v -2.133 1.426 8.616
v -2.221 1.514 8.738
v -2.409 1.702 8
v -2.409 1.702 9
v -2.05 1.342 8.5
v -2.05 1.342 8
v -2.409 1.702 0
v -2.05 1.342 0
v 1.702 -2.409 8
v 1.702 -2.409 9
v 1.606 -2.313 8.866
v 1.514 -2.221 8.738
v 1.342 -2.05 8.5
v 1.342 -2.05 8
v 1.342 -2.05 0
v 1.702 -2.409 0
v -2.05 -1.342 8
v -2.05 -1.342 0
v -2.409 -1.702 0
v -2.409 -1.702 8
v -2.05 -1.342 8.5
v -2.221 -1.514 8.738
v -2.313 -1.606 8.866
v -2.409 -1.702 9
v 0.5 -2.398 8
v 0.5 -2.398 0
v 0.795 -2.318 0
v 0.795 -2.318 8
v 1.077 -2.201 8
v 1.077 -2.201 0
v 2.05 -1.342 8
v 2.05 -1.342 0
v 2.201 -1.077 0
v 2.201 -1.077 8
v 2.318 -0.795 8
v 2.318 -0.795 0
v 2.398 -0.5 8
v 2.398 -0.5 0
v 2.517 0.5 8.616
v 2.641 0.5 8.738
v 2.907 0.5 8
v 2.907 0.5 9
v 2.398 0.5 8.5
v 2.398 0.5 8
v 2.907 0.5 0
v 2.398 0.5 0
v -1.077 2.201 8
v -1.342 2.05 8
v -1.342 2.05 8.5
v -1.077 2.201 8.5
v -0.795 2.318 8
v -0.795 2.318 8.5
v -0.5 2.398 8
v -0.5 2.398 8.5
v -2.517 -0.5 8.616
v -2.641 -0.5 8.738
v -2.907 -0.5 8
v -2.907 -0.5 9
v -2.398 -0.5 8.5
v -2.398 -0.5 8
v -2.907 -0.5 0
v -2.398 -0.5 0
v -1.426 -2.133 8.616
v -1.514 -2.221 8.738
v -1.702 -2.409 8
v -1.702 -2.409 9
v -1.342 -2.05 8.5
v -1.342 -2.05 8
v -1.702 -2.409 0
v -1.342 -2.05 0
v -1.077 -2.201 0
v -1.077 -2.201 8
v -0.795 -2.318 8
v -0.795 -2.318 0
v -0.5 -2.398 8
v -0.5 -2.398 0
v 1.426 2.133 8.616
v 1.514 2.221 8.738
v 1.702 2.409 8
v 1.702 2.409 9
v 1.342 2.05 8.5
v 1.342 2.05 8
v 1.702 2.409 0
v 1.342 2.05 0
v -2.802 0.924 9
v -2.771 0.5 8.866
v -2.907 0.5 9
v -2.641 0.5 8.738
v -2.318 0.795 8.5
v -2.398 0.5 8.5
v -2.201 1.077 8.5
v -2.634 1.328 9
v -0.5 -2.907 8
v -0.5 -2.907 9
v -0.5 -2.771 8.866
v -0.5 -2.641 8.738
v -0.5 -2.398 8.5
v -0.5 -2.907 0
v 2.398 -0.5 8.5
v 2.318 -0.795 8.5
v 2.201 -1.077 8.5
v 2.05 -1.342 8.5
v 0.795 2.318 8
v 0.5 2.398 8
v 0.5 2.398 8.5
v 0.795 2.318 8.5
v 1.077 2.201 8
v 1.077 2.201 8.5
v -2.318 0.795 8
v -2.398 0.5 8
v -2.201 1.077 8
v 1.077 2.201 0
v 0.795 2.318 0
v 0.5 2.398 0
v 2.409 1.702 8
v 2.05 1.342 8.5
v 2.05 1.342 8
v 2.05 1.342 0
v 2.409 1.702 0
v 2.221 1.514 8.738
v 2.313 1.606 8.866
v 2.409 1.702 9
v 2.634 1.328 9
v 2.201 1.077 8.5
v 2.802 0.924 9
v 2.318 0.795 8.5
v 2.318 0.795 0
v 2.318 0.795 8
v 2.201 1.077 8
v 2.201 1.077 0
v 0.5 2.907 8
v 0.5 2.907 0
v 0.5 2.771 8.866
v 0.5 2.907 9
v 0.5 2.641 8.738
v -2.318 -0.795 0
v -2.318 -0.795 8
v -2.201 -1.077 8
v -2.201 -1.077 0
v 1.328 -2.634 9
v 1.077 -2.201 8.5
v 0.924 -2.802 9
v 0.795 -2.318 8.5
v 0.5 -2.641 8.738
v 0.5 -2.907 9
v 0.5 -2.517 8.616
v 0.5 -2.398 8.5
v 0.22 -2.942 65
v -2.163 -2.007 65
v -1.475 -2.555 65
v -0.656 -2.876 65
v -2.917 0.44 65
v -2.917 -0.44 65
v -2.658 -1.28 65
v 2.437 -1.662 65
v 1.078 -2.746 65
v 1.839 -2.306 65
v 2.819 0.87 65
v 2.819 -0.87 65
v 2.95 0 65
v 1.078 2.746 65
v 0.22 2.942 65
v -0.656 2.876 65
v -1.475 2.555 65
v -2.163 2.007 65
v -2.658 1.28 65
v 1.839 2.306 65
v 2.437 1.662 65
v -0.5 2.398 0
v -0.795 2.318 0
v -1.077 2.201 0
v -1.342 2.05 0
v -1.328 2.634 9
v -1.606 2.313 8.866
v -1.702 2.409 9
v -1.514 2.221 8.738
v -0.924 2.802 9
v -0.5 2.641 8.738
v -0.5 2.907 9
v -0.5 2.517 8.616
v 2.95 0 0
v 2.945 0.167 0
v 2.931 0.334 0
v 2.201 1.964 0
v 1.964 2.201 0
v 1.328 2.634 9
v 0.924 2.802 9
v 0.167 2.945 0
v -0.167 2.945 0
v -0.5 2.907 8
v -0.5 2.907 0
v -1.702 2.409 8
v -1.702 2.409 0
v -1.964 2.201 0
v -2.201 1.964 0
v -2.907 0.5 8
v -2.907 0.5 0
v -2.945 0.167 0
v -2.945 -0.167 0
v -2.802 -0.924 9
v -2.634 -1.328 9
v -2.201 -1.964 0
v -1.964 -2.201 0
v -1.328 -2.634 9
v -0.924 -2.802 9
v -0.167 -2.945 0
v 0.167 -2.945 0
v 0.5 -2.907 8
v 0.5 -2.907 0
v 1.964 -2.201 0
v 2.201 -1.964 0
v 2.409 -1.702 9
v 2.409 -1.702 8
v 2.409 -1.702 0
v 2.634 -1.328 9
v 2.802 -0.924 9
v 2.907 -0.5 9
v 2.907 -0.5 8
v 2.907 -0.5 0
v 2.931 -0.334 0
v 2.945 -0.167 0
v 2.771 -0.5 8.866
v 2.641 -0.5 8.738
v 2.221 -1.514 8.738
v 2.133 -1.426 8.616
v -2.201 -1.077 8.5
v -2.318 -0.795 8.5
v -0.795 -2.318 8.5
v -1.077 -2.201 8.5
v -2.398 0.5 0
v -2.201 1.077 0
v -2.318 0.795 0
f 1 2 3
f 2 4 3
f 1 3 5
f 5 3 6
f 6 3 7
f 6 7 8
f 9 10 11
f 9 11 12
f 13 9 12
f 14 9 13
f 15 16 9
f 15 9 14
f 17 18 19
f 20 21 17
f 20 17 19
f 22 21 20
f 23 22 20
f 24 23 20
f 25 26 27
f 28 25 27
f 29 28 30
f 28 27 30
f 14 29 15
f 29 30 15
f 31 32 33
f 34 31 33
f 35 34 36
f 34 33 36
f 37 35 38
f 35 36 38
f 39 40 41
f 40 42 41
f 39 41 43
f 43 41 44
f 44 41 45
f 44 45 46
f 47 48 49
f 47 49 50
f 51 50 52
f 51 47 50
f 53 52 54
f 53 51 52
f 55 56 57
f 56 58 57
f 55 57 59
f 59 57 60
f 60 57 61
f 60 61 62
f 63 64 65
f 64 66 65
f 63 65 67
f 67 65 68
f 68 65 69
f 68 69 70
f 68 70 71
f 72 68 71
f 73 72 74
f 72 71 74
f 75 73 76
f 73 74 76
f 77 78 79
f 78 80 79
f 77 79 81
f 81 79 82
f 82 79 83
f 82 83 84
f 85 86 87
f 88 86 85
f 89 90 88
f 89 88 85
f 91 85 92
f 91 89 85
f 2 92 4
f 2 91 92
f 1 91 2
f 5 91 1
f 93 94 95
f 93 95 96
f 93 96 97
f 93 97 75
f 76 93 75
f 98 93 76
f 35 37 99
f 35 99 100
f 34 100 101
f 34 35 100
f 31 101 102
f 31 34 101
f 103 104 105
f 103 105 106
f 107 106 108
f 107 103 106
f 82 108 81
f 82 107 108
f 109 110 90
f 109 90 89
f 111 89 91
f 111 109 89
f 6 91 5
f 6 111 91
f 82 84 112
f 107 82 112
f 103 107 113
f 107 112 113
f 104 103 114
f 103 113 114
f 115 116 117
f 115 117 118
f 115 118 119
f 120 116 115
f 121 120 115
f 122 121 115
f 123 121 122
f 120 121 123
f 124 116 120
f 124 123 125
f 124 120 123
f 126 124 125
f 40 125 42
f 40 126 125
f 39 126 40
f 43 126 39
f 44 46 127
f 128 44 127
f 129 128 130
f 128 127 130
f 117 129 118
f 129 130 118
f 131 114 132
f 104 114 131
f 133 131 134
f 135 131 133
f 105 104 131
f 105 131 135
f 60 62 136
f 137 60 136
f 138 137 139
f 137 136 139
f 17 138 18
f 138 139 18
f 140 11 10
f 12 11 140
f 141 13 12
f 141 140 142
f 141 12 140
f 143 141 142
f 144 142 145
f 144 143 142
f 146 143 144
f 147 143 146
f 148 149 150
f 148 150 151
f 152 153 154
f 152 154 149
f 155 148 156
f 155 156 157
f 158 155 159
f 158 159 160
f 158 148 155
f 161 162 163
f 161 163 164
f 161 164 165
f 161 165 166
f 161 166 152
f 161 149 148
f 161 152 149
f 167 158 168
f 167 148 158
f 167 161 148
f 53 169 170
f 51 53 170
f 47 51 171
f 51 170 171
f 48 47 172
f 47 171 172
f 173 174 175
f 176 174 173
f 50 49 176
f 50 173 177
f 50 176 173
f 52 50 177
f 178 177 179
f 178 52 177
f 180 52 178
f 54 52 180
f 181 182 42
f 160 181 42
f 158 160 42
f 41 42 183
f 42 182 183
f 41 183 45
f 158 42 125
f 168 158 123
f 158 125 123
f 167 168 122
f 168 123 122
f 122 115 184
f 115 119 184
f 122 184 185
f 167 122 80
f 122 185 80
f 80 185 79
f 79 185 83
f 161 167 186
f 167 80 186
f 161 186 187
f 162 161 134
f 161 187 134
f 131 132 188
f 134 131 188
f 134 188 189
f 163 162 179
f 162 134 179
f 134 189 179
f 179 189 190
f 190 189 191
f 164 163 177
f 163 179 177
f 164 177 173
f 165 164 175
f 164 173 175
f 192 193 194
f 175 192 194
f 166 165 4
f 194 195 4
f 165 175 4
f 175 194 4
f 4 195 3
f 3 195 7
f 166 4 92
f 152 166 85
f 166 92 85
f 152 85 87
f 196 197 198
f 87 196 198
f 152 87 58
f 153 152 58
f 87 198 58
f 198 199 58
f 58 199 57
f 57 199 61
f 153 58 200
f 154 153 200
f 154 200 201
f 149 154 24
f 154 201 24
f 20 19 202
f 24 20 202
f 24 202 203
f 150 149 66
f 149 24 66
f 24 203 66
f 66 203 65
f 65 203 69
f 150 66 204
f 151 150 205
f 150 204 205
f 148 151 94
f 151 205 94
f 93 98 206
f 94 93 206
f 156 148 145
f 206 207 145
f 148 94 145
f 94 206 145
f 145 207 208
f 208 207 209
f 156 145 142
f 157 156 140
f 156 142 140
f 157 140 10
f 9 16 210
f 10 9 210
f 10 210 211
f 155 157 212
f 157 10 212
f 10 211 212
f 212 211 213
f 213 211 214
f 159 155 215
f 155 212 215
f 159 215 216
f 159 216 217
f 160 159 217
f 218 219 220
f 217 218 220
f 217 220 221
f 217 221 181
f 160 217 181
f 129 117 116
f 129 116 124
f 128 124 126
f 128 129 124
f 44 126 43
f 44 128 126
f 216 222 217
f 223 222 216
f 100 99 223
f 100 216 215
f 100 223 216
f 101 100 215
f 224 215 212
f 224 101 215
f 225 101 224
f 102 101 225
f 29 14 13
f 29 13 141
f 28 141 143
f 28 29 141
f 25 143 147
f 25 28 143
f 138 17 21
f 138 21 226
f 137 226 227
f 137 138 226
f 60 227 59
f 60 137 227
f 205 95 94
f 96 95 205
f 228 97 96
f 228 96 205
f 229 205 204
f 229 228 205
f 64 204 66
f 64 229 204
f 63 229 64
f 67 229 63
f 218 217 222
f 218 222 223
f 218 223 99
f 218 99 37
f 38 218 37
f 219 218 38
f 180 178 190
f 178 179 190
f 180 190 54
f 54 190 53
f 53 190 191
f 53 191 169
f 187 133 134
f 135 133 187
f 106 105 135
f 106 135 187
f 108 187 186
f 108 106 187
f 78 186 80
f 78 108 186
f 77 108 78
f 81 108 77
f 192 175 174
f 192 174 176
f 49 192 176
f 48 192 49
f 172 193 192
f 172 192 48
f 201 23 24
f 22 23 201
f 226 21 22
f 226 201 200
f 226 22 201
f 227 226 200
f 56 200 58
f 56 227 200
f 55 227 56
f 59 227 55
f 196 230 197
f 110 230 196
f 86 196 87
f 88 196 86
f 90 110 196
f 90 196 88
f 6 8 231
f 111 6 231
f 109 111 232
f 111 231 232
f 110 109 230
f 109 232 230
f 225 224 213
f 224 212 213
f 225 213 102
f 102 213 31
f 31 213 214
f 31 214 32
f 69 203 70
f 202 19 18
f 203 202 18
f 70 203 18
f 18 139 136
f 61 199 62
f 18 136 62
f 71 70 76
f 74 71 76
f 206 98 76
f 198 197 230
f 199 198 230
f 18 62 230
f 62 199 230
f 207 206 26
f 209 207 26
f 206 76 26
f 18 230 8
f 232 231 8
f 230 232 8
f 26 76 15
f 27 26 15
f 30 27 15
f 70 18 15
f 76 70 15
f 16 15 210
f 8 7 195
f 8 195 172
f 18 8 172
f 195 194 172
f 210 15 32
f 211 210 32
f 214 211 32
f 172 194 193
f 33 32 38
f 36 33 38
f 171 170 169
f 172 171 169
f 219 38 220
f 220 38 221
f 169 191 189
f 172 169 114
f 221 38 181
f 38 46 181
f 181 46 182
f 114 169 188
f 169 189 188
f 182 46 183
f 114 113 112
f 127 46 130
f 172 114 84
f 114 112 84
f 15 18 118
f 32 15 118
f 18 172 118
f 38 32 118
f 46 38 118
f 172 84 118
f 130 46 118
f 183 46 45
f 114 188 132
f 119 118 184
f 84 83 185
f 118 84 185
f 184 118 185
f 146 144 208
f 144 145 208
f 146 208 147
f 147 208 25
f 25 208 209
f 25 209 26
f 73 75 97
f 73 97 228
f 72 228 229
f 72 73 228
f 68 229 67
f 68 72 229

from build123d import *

# Parameters (mm, degrees)
SKETCH1_R           = 2.95
BOSS_EXTRUDE1_DEPTH = 65
CUT_EXTRUDE1_DEPTH  = 8
CHAMFER1_SIZE       = 1


with BuildPart() as part:
    # Sketch1 → Boss-Extrude1 (new body)
    with BuildSketch(Plane.XY):
        Circle(SKETCH1_R)
    extrude(amount=BOSS_EXTRUDE1_DEPTH)

    # Sketch2 → Cut-Extrude1 (cut)
    with BuildSketch(Plane(origin=(0, 0, 0), x_dir=(-1, 0, 0), z_dir=(0, 0, -1))):
        with BuildLine():
            ThreePointArc((-2.398436991, 0.5), (-2.263504855, 0.937574409), (-2.049504451, 1.34239767))
            Line((-2.049504451, 1.34239767), (-2.409337912, 1.702231131))
            ThreePointArc((-2.409337912, 1.702231131), (-2.725444621, 1.128916125), (-2.907318352, 0.5))
            Line((-2.907318352, 0.5), (-2.398436991, 0.5))
        make_face()
        with BuildLine():
            ThreePointArc((-1.34239767, 2.049504451), (-0.937574409, 2.263504855), (-0.5, 2.398436991))
            Line((-0.5, 2.398436991), (-0.5, 2.907318352))
            ThreePointArc((-0.5, 2.907318352), (-1.128916125, 2.725444621), (-1.702231131, 2.409337912))
            Line((-1.702231131, 2.409337912), (-1.34239767, 2.049504451))
        make_face()
        with BuildLine():
            Line((0.5, 2.907318352), (0.5, 2.398436991))
            ThreePointArc((0.5, 2.398436991), (0.937574409, 2.263504855), (1.34239767, 2.049504451))
            Line((1.34239767, 2.049504451), (1.702231131, 2.409337912))
            ThreePointArc((1.702231131, 2.409337912), (1.128916125, 2.725444621), (0.5, 2.907318352))
        make_face()
        with BuildLine():
            Line((2.409337912, 1.702231131), (2.049504451, 1.34239767))
            ThreePointArc((2.049504451, 1.34239767), (2.263504855, 0.937574409), (2.398436991, 0.5))
            Line((2.398436991, 0.5), (2.907318352, 0.5))
            ThreePointArc((2.907318352, 0.5), (2.725444621, 1.128916125), (2.409337912, 1.702231131))
        make_face()
        with BuildLine():
            Line((2.907318352, -0.5), (2.398436991, -0.5))
            ThreePointArc((2.398436991, -0.5), (2.263504855, -0.937574409), (2.049504451, -1.34239767))
            Line((2.049504451, -1.34239767), (2.409337912, -1.702231131))
            ThreePointArc((2.409337912, -1.702231131), (2.725444621, -1.128916125), (2.907318352, -0.5))
        make_face()
        with BuildLine():
            Line((1.702231131, -2.409337912), (1.34239767, -2.049504451))
            ThreePointArc((1.34239767, -2.049504451), (0.937574409, -2.263504855), (0.5, -2.398436991))
            Line((0.5, -2.398436991), (0.5, -2.907318352))
            ThreePointArc((0.5, -2.907318352), (1.128916125, -2.725444621), (1.702231131, -2.409337912))
        make_face()
        with BuildLine():
            ThreePointArc((-0.5, -2.398436991), (-0.937574409, -2.263504855), (-1.34239767, -2.049504451))
            Line((-1.34239767, -2.049504451), (-1.702231131, -2.409337912))
            ThreePointArc((-1.702231131, -2.409337912), (-1.128916125, -2.725444621), (-0.5, -2.907318352))
            Line((-0.5, -2.907318352), (-0.5, -2.398436991))
        make_face()
        with BuildLine():
            ThreePointArc((-2.049504451, -1.34239767), (-2.263504855, -0.937574409), (-2.398436991, -0.5))
            Line((-2.398436991, -0.5), (-2.907318352, -0.5))
            ThreePointArc((-2.907318352, -0.5), (-2.725444621, -1.128916125), (-2.409337912, -1.702231131))
            Line((-2.409337912, -1.702231131), (-2.049504451, -1.34239767))
        make_face()
    extrude(amount=-CUT_EXTRUDE1_DEPTH, mode=Mode.SUBTRACT)

    # Chamfer1
    # the kernel refuses this chamfer: 1 mm, written as the material it takes off along each edge
    with BuildSketch(Plane(origin=(0, 0, 8), x_dir=(0.6453423073627431, -0.7638935176631171, 0), z_dir=(0.7638935176631171, 0.6453423073627431, 0))) as chamfer1_piece_1_section:
        Polygon((2.95, -CHAMFER1_SIZE), (2.95 - CHAMFER1_SIZE, 0), (2.95, 0), align=None)
    chamfer1_piece_1 = revolve(axis=Axis((0, 0, 8), (0, 0, -1)), revolution_arc=125.382690704, mode=Mode.PRIVATE)
    chamfer1_piece_1 = split(chamfer1_piece_1, bisect_by=Plane(origin=(0.5, 0, 8), z_dir=(1, 0, 0)), keep=Keep.TOP, mode=Mode.PRIVATE)
    chamfer1_piece_1 = split(chamfer1_piece_1, bisect_by=Plane(origin=(-0.353553391, -0.353553391, 8), z_dir=(-0.7071067811865415, -0.7071067811865537, 0)), keep=Keep.TOP, mode=Mode.PRIVATE)
    chamfer1_piece_1 = chamfer1_piece_1 - Plane(origin=(0, 0, 8), x_dir=(0.20408163265306725, -0.9789538738948115, 0), z_dir=(0, 0, -1)) * Cylinder(2.45, 12, mode=Mode.PRIVATE)
    add(chamfer1_piece_1, mode=Mode.SUBTRACT)
    with BuildSketch(Plane(origin=(0, 0, 8), x_dir=(0.6453423073627431, -0.7638935176631171, 0), z_dir=(0.7638935176631171, 0.6453423073627431, 0))) as chamfer1_piece_2_section:
        Polygon((2.95, -CHAMFER1_SIZE), (2.95 - CHAMFER1_SIZE, 0), (2.95, 0), align=None)
    chamfer1_piece_2 = revolve(axis=Axis((0, 0, 8), (0, 0, -1)), revolution_arc=125.382690704, mode=Mode.PRIVATE)
    chamfer1_piece_2 = split(chamfer1_piece_2, bisect_by=Plane(origin=(0.353553391, -0.353553391, 8), z_dir=(0.7071067811865517, -0.7071067811865434, 0)), keep=Keep.TOP, mode=Mode.PRIVATE)
    chamfer1_piece_2 = split(chamfer1_piece_2, bisect_by=Plane(origin=(-0.5, 0, 8), z_dir=(-1, 0, 0)), keep=Keep.TOP, mode=Mode.PRIVATE)
    chamfer1_piece_2 = chamfer1_piece_2 - Plane(origin=(0, 0, 8), x_dir=(0.20408163265306725, -0.9789538738948115, 0), z_dir=(0, 0, -1)) * Cylinder(2.45, 12, mode=Mode.PRIVATE)
    add(chamfer1_piece_2, mode=Mode.SUBTRACT)
    with BuildSketch(Plane(origin=(0, 0, 8), x_dir=(0.6453423073627431, -0.7638935176631171, 0), z_dir=(0.7638935176631171, 0.6453423073627431, 0))) as chamfer1_piece_3_section:
        Polygon((2.95, -CHAMFER1_SIZE), (2.95 - CHAMFER1_SIZE, 0), (2.95, 0), align=None)
    chamfer1_piece_3 = revolve(axis=Axis((0, 0, 8), (0, 0, -1)), revolution_arc=125.382690704, mode=Mode.PRIVATE)
    chamfer1_piece_3 = split(chamfer1_piece_3, bisect_by=Plane(origin=(0, -0.5, 8), z_dir=(0, -1, 0)), keep=Keep.TOP, mode=Mode.PRIVATE)
    chamfer1_piece_3 = split(chamfer1_piece_3, bisect_by=Plane(origin=(-0.353553391, 0.353553391, 8), z_dir=(-0.7071067811865515, 0.7071067811865437, 0)), keep=Keep.TOP, mode=Mode.PRIVATE)
    chamfer1_piece_3 = chamfer1_piece_3 - Plane(origin=(0, 0, 8), x_dir=(0.20408163265306725, -0.9789538738948115, 0), z_dir=(0, 0, -1)) * Cylinder(2.45, 12, mode=Mode.PRIVATE)
    add(chamfer1_piece_3, mode=Mode.SUBTRACT)
    with BuildSketch(Plane(origin=(0, 0, 8), x_dir=(-0.083828364721268, -0.9964802081668046, 0), z_dir=(0.9964802081668046, -0.083828364721268, 0))) as chamfer1_piece_4_section:
        Polygon((2.95, -CHAMFER1_SIZE), (2.95 - CHAMFER1_SIZE, 0), (2.95, 0), align=None)
    chamfer1_piece_4 = revolve(axis=Axis((0, 0, 8), (0, 0, -1)), revolution_arc=125.382690704, mode=Mode.PRIVATE)
    chamfer1_piece_4 = split(chamfer1_piece_4, bisect_by=Plane(origin=(0.353553391, -0.353553391, 8), z_dir=(0.7071067811865517, -0.7071067811865434, 0)), keep=Keep.TOP, mode=Mode.PRIVATE)
    chamfer1_piece_4 = split(chamfer1_piece_4, bisect_by=Plane(origin=(-0.5, 0, 8), z_dir=(-1, 0, 0)), keep=Keep.TOP, mode=Mode.PRIVATE)
    chamfer1_piece_4 = chamfer1_piece_4 - Plane(origin=(0, 0, 8), x_dir=(-0.5479174163352548, -0.8365324290644679, 0), z_dir=(0, 0, -1)) * Cylinder(2.45, 12, mode=Mode.PRIVATE)
    add(chamfer1_piece_4, mode=Mode.SUBTRACT)
    with BuildSketch(Plane(origin=(0, 0, 8), x_dir=(-0.083828364721268, -0.9964802081668046, 0), z_dir=(0.9964802081668046, -0.083828364721268, 0))) as chamfer1_piece_5_section:
        Polygon((2.95, -CHAMFER1_SIZE), (2.95 - CHAMFER1_SIZE, 0), (2.95, 0), align=None)
    chamfer1_piece_5 = revolve(axis=Axis((0, 0, 8), (0, 0, -1)), revolution_arc=125.382690704, mode=Mode.PRIVATE)
    chamfer1_piece_5 = split(chamfer1_piece_5, bisect_by=Plane(origin=(0, -0.5, 8), z_dir=(0, -1, 0)), keep=Keep.TOP, mode=Mode.PRIVATE)
    chamfer1_piece_5 = split(chamfer1_piece_5, bisect_by=Plane(origin=(-0.353553391, 0.353553391, 8), z_dir=(-0.7071067811865515, 0.7071067811865437, 0)), keep=Keep.TOP, mode=Mode.PRIVATE)
    chamfer1_piece_5 = chamfer1_piece_5 - Plane(origin=(0, 0, 8), x_dir=(-0.5479174163352548, -0.8365324290644679, 0), z_dir=(0, 0, -1)) * Cylinder(2.45, 12, mode=Mode.PRIVATE)
    add(chamfer1_piece_5, mode=Mode.SUBTRACT)
    with BuildSketch(Plane(origin=(0, 0, 8), x_dir=(-0.083828364721268, -0.9964802081668046, 0), z_dir=(0.9964802081668046, -0.083828364721268, 0))) as chamfer1_piece_6_section:
        Polygon((2.95, -CHAMFER1_SIZE), (2.95 - CHAMFER1_SIZE, 0), (2.95, 0), align=None)
    chamfer1_piece_6 = revolve(axis=Axis((0, 0, 8), (0, 0, -1)), revolution_arc=125.382690704, mode=Mode.PRIVATE)
    chamfer1_piece_6 = split(chamfer1_piece_6, bisect_by=Plane(origin=(-0.353553391, -0.353553391, 8), z_dir=(-0.7071067811865454, -0.7071067811865497, 0)), keep=Keep.TOP, mode=Mode.PRIVATE)
    chamfer1_piece_6 = split(chamfer1_piece_6, bisect_by=Plane(origin=(0, 0.5, 8), z_dir=(0, 1, 0)), keep=Keep.TOP, mode=Mode.PRIVATE)
    chamfer1_piece_6 = chamfer1_piece_6 - Plane(origin=(0, 0, 8), x_dir=(-0.5479174163352548, -0.8365324290644679, 0), z_dir=(0, 0, -1)) * Cylinder(2.45, 12, mode=Mode.PRIVATE)
    add(chamfer1_piece_6, mode=Mode.SUBTRACT)
    with BuildSketch(Plane(origin=(0, 0, 8), x_dir=(-0.7638935176631205, -0.645342307362739, 0), z_dir=(0.645342307362739, -0.7638935176631205, 0))) as chamfer1_piece_7_section:
        Polygon((2.95, -CHAMFER1_SIZE), (2.95 - CHAMFER1_SIZE, 0), (2.95, 0), align=None)
    chamfer1_piece_7 = revolve(axis=Axis((0, 0, 8), (0, 0, -1)), revolution_arc=125.382690704, mode=Mode.PRIVATE)
    chamfer1_piece_7 = split(chamfer1_piece_7, bisect_by=Plane(origin=(0, -0.5, 8), z_dir=(0, -1, 0)), keep=Keep.TOP, mode=Mode.PRIVATE)
    chamfer1_piece_7 = split(chamfer1_piece_7, bisect_by=Plane(origin=(-0.353553391, 0.353553391, 8), z_dir=(-0.7071067811865515, 0.7071067811865437, 0)), keep=Keep.TOP, mode=Mode.PRIVATE)
    chamfer1_piece_7 = chamfer1_piece_7 - Plane(origin=(0, 0, 8), x_dir=(-0.9789538738948118, -0.20408163265306617, 0), z_dir=(0, 0, -1)) * Cylinder(2.45, 12, mode=Mode.PRIVATE)
    add(chamfer1_piece_7, mode=Mode.SUBTRACT)
    with BuildSketch(Plane(origin=(0, 0, 8), x_dir=(-0.7638935176631205, -0.645342307362739, 0), z_dir=(0.645342307362739, -0.7638935176631205, 0))) as chamfer1_piece_8_section:
        Polygon((2.95, -CHAMFER1_SIZE), (2.95 - CHAMFER1_SIZE, 0), (2.95, 0), align=None)
    chamfer1_piece_8 = revolve(axis=Axis((0, 0, 8), (0, 0, -1)), revolution_arc=125.382690704, mode=Mode.PRIVATE)
    chamfer1_piece_8 = split(chamfer1_piece_8, bisect_by=Plane(origin=(-0.353553391, -0.353553391, 8), z_dir=(-0.7071067811865454, -0.7071067811865497, 0)), keep=Keep.TOP, mode=Mode.PRIVATE)
    chamfer1_piece_8 = split(chamfer1_piece_8, bisect_by=Plane(origin=(0, 0.5, 8), z_dir=(0, 1, 0)), keep=Keep.TOP, mode=Mode.PRIVATE)
    chamfer1_piece_8 = chamfer1_piece_8 - Plane(origin=(0, 0, 8), x_dir=(-0.9789538738948118, -0.20408163265306617, 0), z_dir=(0, 0, -1)) * Cylinder(2.45, 12, mode=Mode.PRIVATE)
    add(chamfer1_piece_8, mode=Mode.SUBTRACT)
    with BuildSketch(Plane(origin=(0, 0, 8), x_dir=(-0.7638935176631205, -0.645342307362739, 0), z_dir=(0.645342307362739, -0.7638935176631205, 0))) as chamfer1_piece_9_section:
        Polygon((2.95, -CHAMFER1_SIZE), (2.95 - CHAMFER1_SIZE, 0), (2.95, 0), align=None)
    chamfer1_piece_9 = revolve(axis=Axis((0, 0, 8), (0, 0, -1)), revolution_arc=125.382690704, mode=Mode.PRIVATE)
    chamfer1_piece_9 = split(chamfer1_piece_9, bisect_by=Plane(origin=(-0.5, 0, 8), z_dir=(-1, 0, 0)), keep=Keep.TOP, mode=Mode.PRIVATE)
    chamfer1_piece_9 = split(chamfer1_piece_9, bisect_by=Plane(origin=(0.353553391, 0.353553391, 8), z_dir=(0.7071067811865474, 0.7071067811865477, 0)), keep=Keep.TOP, mode=Mode.PRIVATE)
    chamfer1_piece_9 = chamfer1_piece_9 - Plane(origin=(0, 0, 8), x_dir=(-0.9789538738948118, -0.20408163265306617, 0), z_dir=(0, 0, -1)) * Cylinder(2.45, 12, mode=Mode.PRIVATE)
    add(chamfer1_piece_9, mode=Mode.SUBTRACT)
    with BuildSketch(Plane(origin=(0, 0, 8), x_dir=(-0.9964802081668033, 0.08382836472128195, 0), z_dir=(-0.08382836472128195, -0.9964802081668033, 0))) as chamfer1_piece_10_section:
        Polygon((2.95, -CHAMFER1_SIZE), (2.95 - CHAMFER1_SIZE, 0), (2.95, 0), align=None)
    chamfer1_piece_10 = revolve(axis=Axis((0, 0, 8), (0, 0, -1)), revolution_arc=125.382690704, mode=Mode.PRIVATE)
    chamfer1_piece_10 = split(chamfer1_piece_10, bisect_by=Plane(origin=(-0.353553391, -0.353553391, 8), z_dir=(-0.7071067811865454, -0.7071067811865497, 0)), keep=Keep.TOP, mode=Mode.PRIVATE)
    chamfer1_piece_10 = split(chamfer1_piece_10, bisect_by=Plane(origin=(0, 0.5, 8), z_dir=(0, 1, 0)), keep=Keep.TOP, mode=Mode.PRIVATE)
    chamfer1_piece_10 = chamfer1_piece_10 - Plane(origin=(0, 0, 8), x_dir=(-0.836532429064466, 0.5479174163352577, 0), z_dir=(0, 0, -1)) * Cylinder(2.45, 12, mode=Mode.PRIVATE)
    add(chamfer1_piece_10, mode=Mode.SUBTRACT)
    with BuildSketch(Plane(origin=(0, 0, 8), x_dir=(-0.9964802081668033, 0.08382836472128195, 0), z_dir=(-0.08382836472128195, -0.9964802081668033, 0))) as chamfer1_piece_11_section:
        Polygon((2.95, -CHAMFER1_SIZE), (2.95 - CHAMFER1_SIZE, 0), (2.95, 0), align=None)
    chamfer1_piece_11 = revolve(axis=Axis((0, 0, 8), (0, 0, -1)), revolution_arc=125.382690704, mode=Mode.PRIVATE)
    chamfer1_piece_11 = split(chamfer1_piece_11, bisect_by=Plane(origin=(-0.5, 0, 8), z_dir=(-1, 0, 0)), keep=Keep.TOP, mode=Mode.PRIVATE)
    chamfer1_piece_11 = split(chamfer1_piece_11, bisect_by=Plane(origin=(0.353553391, 0.353553391, 8), z_dir=(0.7071067811865474, 0.7071067811865477, 0)), keep=Keep.TOP, mode=Mode.PRIVATE)
    chamfer1_piece_11 = chamfer1_piece_11 - Plane(origin=(0, 0, 8), x_dir=(-0.836532429064466, 0.5479174163352577, 0), z_dir=(0, 0, -1)) * Cylinder(2.45, 12, mode=Mode.PRIVATE)
    add(chamfer1_piece_11, mode=Mode.SUBTRACT)
    with BuildSketch(Plane(origin=(0, 0, 8), x_dir=(-0.9964802081668033, 0.08382836472128195, 0), z_dir=(-0.08382836472128195, -0.9964802081668033, 0))) as chamfer1_piece_12_section:
        Polygon((2.95, -CHAMFER1_SIZE), (2.95 - CHAMFER1_SIZE, 0), (2.95, 0), align=None)
    chamfer1_piece_12 = revolve(axis=Axis((0, 0, 8), (0, 0, -1)), revolution_arc=125.382690704, mode=Mode.PRIVATE)
    chamfer1_piece_12 = split(chamfer1_piece_12, bisect_by=Plane(origin=(-0.353553391, 0.353553391, 8), z_dir=(-0.7071067811865565, 0.7071067811865386, 0)), keep=Keep.TOP, mode=Mode.PRIVATE)
    chamfer1_piece_12 = split(chamfer1_piece_12, bisect_by=Plane(origin=(0.5, 0, 8), z_dir=(1, 0, 0)), keep=Keep.TOP, mode=Mode.PRIVATE)
    chamfer1_piece_12 = chamfer1_piece_12 - Plane(origin=(0, 0, 8), x_dir=(-0.836532429064466, 0.5479174163352577, 0), z_dir=(0, 0, -1)) * Cylinder(2.45, 12, mode=Mode.PRIVATE)
    add(chamfer1_piece_12, mode=Mode.SUBTRACT)
    with BuildSketch(Plane(origin=(0, 0, 8), x_dir=(0.9964802081668043, -0.08382836472127134, 0), z_dir=(0.08382836472127134, 0.9964802081668043, 0))) as chamfer1_piece_13_section:
        Polygon((2.95, -CHAMFER1_SIZE), (2.95 - CHAMFER1_SIZE, 0), (2.95, 0), align=None)
    chamfer1_piece_13 = revolve(axis=Axis((0, 0, 8), (0, 0, -1)), revolution_arc=125.382690704, mode=Mode.PRIVATE)
    chamfer1_piece_13 = split(chamfer1_piece_13, bisect_by=Plane(origin=(0.353553391, 0.353553391, 8), z_dir=(0.707106781186541, 0.7071067811865541, 0)), keep=Keep.TOP, mode=Mode.PRIVATE)
    chamfer1_piece_13 = split(chamfer1_piece_13, bisect_by=Plane(origin=(0, -0.5, 8), z_dir=(0, -1, 0)), keep=Keep.TOP, mode=Mode.PRIVATE)
    chamfer1_piece_13 = chamfer1_piece_13 - Plane(origin=(0, 0, 8), x_dir=(0.8365324290644678, -0.5479174163352549, 0), z_dir=(0, 0, -1)) * Cylinder(2.45, 12, mode=Mode.PRIVATE)
    add(chamfer1_piece_13, mode=Mode.SUBTRACT)
    with BuildSketch(Plane(origin=(0, 0, 8), x_dir=(0.9964802081668043, -0.08382836472127134, 0), z_dir=(0.08382836472127134, 0.9964802081668043, 0))) as chamfer1_piece_14_section:
        Polygon((2.95, -CHAMFER1_SIZE), (2.95 - CHAMFER1_SIZE, 0), (2.95, 0), align=None)
    chamfer1_piece_14 = revolve(axis=Axis((0, 0, 8), (0, 0, -1)), revolution_arc=125.382690704, mode=Mode.PRIVATE)
    chamfer1_piece_14 = split(chamfer1_piece_14, bisect_by=Plane(origin=(0.5, 0, 8), z_dir=(1, 0, 0)), keep=Keep.TOP, mode=Mode.PRIVATE)
    chamfer1_piece_14 = split(chamfer1_piece_14, bisect_by=Plane(origin=(-0.353553391, -0.353553391, 8), z_dir=(-0.7071067811865415, -0.7071067811865537, 0)), keep=Keep.TOP, mode=Mode.PRIVATE)
    chamfer1_piece_14 = chamfer1_piece_14 - Plane(origin=(0, 0, 8), x_dir=(0.8365324290644678, -0.5479174163352549, 0), z_dir=(0, 0, -1)) * Cylinder(2.45, 12, mode=Mode.PRIVATE)
    add(chamfer1_piece_14, mode=Mode.SUBTRACT)
    with BuildSketch(Plane(origin=(0, 0, 8), x_dir=(0.9964802081668043, -0.08382836472127134, 0), z_dir=(0.08382836472127134, 0.9964802081668043, 0))) as chamfer1_piece_15_section:
        Polygon((2.95, -CHAMFER1_SIZE), (2.95 - CHAMFER1_SIZE, 0), (2.95, 0), align=None)
    chamfer1_piece_15 = revolve(axis=Axis((0, 0, 8), (0, 0, -1)), revolution_arc=125.382690704, mode=Mode.PRIVATE)
    chamfer1_piece_15 = split(chamfer1_piece_15, bisect_by=Plane(origin=(0.353553391, -0.353553391, 8), z_dir=(0.7071067811865517, -0.7071067811865434, 0)), keep=Keep.TOP, mode=Mode.PRIVATE)
    chamfer1_piece_15 = split(chamfer1_piece_15, bisect_by=Plane(origin=(-0.5, 0, 8), z_dir=(-1, 0, 0)), keep=Keep.TOP, mode=Mode.PRIVATE)
    chamfer1_piece_15 = chamfer1_piece_15 - Plane(origin=(0, 0, 8), x_dir=(0.8365324290644678, -0.5479174163352549, 0), z_dir=(0, 0, -1)) * Cylinder(2.45, 12, mode=Mode.PRIVATE)
    add(chamfer1_piece_15, mode=Mode.SUBTRACT)
    with BuildSketch(Plane(origin=(0, 0, 8), x_dir=(0.7638935176631216, 0.6453423073627377, 0), z_dir=(-0.6453423073627377, 0.7638935176631216, 0))) as chamfer1_piece_16_section:
        Polygon((2.95, -CHAMFER1_SIZE), (2.95 - CHAMFER1_SIZE, 0), (2.95, 0), align=None)
    chamfer1_piece_16 = revolve(axis=Axis((0, 0, 8), (0, 0, -1)), revolution_arc=125.382690704, mode=Mode.PRIVATE)
    chamfer1_piece_16 = split(chamfer1_piece_16, bisect_by=Plane(origin=(0, 0.5, 8), z_dir=(0, 1, 0)), keep=Keep.TOP, mode=Mode.PRIVATE)
    chamfer1_piece_16 = split(chamfer1_piece_16, bisect_by=Plane(origin=(0.353553391, -0.353553391, 8), z_dir=(0.707106781186556, -0.707106781186539, 0)), keep=Keep.TOP, mode=Mode.PRIVATE)
    chamfer1_piece_16 = chamfer1_piece_16 - Plane(origin=(0, 0, 8), x_dir=(0.8365324290644678, -0.5479174163352549, 0), z_dir=(0, 0, -1)) * Cylinder(2.45, 12, mode=Mode.PRIVATE)
    add(chamfer1_piece_16, mode=Mode.SUBTRACT)
    with BuildSketch(Plane(origin=(0, 0, 8), x_dir=(0.7638935176631216, 0.6453423073627377, 0), z_dir=(-0.6453423073627377, 0.7638935176631216, 0))) as chamfer1_piece_17_section:
        Polygon((2.95, -CHAMFER1_SIZE), (2.95 - CHAMFER1_SIZE, 0), (2.95, 0), align=None)
    chamfer1_piece_17 = revolve(axis=Axis((0, 0, 8), (0, 0, -1)), revolution_arc=125.382690704, mode=Mode.PRIVATE)
    chamfer1_piece_17 = split(chamfer1_piece_17, bisect_by=Plane(origin=(0.353553391, 0.353553391, 8), z_dir=(0.707106781186541, 0.7071067811865541, 0)), keep=Keep.TOP, mode=Mode.PRIVATE)
    chamfer1_piece_17 = split(chamfer1_piece_17, bisect_by=Plane(origin=(0, -0.5, 8), z_dir=(0, -1, 0)), keep=Keep.TOP, mode=Mode.PRIVATE)
    chamfer1_piece_17 = chamfer1_piece_17 - Plane(origin=(0, 0, 8), x_dir=(0.8365324290644678, -0.5479174163352549, 0), z_dir=(0, 0, -1)) * Cylinder(2.45, 12, mode=Mode.PRIVATE)
    add(chamfer1_piece_17, mode=Mode.SUBTRACT)
    with BuildSketch(Plane(origin=(0, 0, 8), x_dir=(0.7638935176631216, 0.6453423073627377, 0), z_dir=(-0.6453423073627377, 0.7638935176631216, 0))) as chamfer1_piece_18_section:
        Polygon((2.95, -CHAMFER1_SIZE), (2.95 - CHAMFER1_SIZE, 0), (2.95, 0), align=None)
    chamfer1_piece_18 = revolve(axis=Axis((0, 0, 8), (0, 0, -1)), revolution_arc=125.382690704, mode=Mode.PRIVATE)
    chamfer1_piece_18 = split(chamfer1_piece_18, bisect_by=Plane(origin=(0.5, 0, 8), z_dir=(1, 0, 0)), keep=Keep.TOP, mode=Mode.PRIVATE)
    chamfer1_piece_18 = split(chamfer1_piece_18, bisect_by=Plane(origin=(-0.353553391, -0.353553391, 8), z_dir=(-0.7071067811865415, -0.7071067811865537, 0)), keep=Keep.TOP, mode=Mode.PRIVATE)
    chamfer1_piece_18 = chamfer1_piece_18 - Plane(origin=(0, 0, 8), x_dir=(0.8365324290644678, -0.5479174163352549, 0), z_dir=(0, 0, -1)) * Cylinder(2.45, 12, mode=Mode.PRIVATE)
    add(chamfer1_piece_18, mode=Mode.SUBTRACT)
    with BuildSketch(Plane(origin=(0, 0, 8), x_dir=(0.08382836472126272, 0.996480208166805, 0), z_dir=(-0.996480208166805, 0.08382836472126272, 0))) as chamfer1_piece_19_section:
        Polygon((2.95, -CHAMFER1_SIZE), (2.95 - CHAMFER1_SIZE, 0), (2.95, 0), align=None)
    chamfer1_piece_19 = revolve(axis=Axis((0, 0, 8), (0, 0, -1)), revolution_arc=125.382690704, mode=Mode.PRIVATE)
    chamfer1_piece_19 = split(chamfer1_piece_19, bisect_by=Plane(origin=(-0.353553391, 0.353553391, 8), z_dir=(-0.7071067811865565, 0.7071067811865386, 0)), keep=Keep.TOP, mode=Mode.PRIVATE)
    chamfer1_piece_19 = split(chamfer1_piece_19, bisect_by=Plane(origin=(0.5, 0, 8), z_dir=(1, 0, 0)), keep=Keep.TOP, mode=Mode.PRIVATE)
    chamfer1_piece_19 = chamfer1_piece_19 - Plane(origin=(0, 0, 8), x_dir=(0.8365324290644678, -0.5479174163352549, 0), z_dir=(0, 0, -1)) * Cylinder(2.45, 12, mode=Mode.PRIVATE)
    add(chamfer1_piece_19, mode=Mode.SUBTRACT)
    with BuildSketch(Plane(origin=(0, 0, 8), x_dir=(0.08382836472126272, 0.996480208166805, 0), z_dir=(-0.996480208166805, 0.08382836472126272, 0))) as chamfer1_piece_20_section:
        Polygon((2.95, -CHAMFER1_SIZE), (2.95 - CHAMFER1_SIZE, 0), (2.95, 0), align=None)
    chamfer1_piece_20 = revolve(axis=Axis((0, 0, 8), (0, 0, -1)), revolution_arc=125.382690704, mode=Mode.PRIVATE)
    chamfer1_piece_20 = split(chamfer1_piece_20, bisect_by=Plane(origin=(0, 0.5, 8), z_dir=(0, 1, 0)), keep=Keep.TOP, mode=Mode.PRIVATE)
    chamfer1_piece_20 = split(chamfer1_piece_20, bisect_by=Plane(origin=(0.353553391, -0.353553391, 8), z_dir=(0.707106781186556, -0.707106781186539, 0)), keep=Keep.TOP, mode=Mode.PRIVATE)
    chamfer1_piece_20 = chamfer1_piece_20 - Plane(origin=(0, 0, 8), x_dir=(0.8365324290644678, -0.5479174163352549, 0), z_dir=(0, 0, -1)) * Cylinder(2.45, 12, mode=Mode.PRIVATE)
    add(chamfer1_piece_20, mode=Mode.SUBTRACT)
    with BuildSketch(Plane(origin=(0, 0, 8), x_dir=(0.08382836472126272, 0.996480208166805, 0), z_dir=(-0.996480208166805, 0.08382836472126272, 0))) as chamfer1_piece_21_section:
        Polygon((2.95, -CHAMFER1_SIZE), (2.95 - CHAMFER1_SIZE, 0), (2.95, 0), align=None)
    chamfer1_piece_21 = revolve(axis=Axis((0, 0, 8), (0, 0, -1)), revolution_arc=125.382690704, mode=Mode.PRIVATE)
    chamfer1_piece_21 = split(chamfer1_piece_21, bisect_by=Plane(origin=(0.353553391, 0.353553391, 8), z_dir=(0.707106781186541, 0.7071067811865541, 0)), keep=Keep.TOP, mode=Mode.PRIVATE)
    chamfer1_piece_21 = split(chamfer1_piece_21, bisect_by=Plane(origin=(0, -0.5, 8), z_dir=(0, -1, 0)), keep=Keep.TOP, mode=Mode.PRIVATE)
    chamfer1_piece_21 = chamfer1_piece_21 - Plane(origin=(0, 0, 8), x_dir=(0.8365324290644678, -0.5479174163352549, 0), z_dir=(0, 0, -1)) * Cylinder(2.45, 12, mode=Mode.PRIVATE)
    add(chamfer1_piece_21, mode=Mode.SUBTRACT)
    with BuildSketch(Plane(origin=(0, 0, 8), x_dir=(-0.6453423073627307, 0.7638935176631274, 0), z_dir=(-0.7638935176631274, -0.6453423073627307, 0))) as chamfer1_piece_22_section:
        Polygon((2.95, -CHAMFER1_SIZE), (2.95 - CHAMFER1_SIZE, 0), (2.95, 0), align=None)
    chamfer1_piece_22 = revolve(axis=Axis((0, 0, 8), (0, 0, -1)), revolution_arc=125.382690704, mode=Mode.PRIVATE)
    chamfer1_piece_22 = split(chamfer1_piece_22, bisect_by=Plane(origin=(-0.5, 0, 8), z_dir=(-1, 0, 0)), keep=Keep.TOP, mode=Mode.PRIVATE)
    chamfer1_piece_22 = split(chamfer1_piece_22, bisect_by=Plane(origin=(0.353553391, 0.353553391, 8), z_dir=(0.7071067811865474, 0.7071067811865477, 0)), keep=Keep.TOP, mode=Mode.PRIVATE)
    chamfer1_piece_22 = chamfer1_piece_22 - Plane(origin=(0, 0, 8), x_dir=(-0.2040816326530623, 0.9789538738948126, 0), z_dir=(0, 0, -1)) * Cylinder(2.45, 12, mode=Mode.PRIVATE)
    add(chamfer1_piece_22, mode=Mode.SUBTRACT)
    with BuildSketch(Plane(origin=(0, 0, 8), x_dir=(-0.6453423073627307, 0.7638935176631274, 0), z_dir=(-0.7638935176631274, -0.6453423073627307, 0))) as chamfer1_piece_23_section:
        Polygon((2.95, -CHAMFER1_SIZE), (2.95 - CHAMFER1_SIZE, 0), (2.95, 0), align=None)
    chamfer1_piece_23 = revolve(axis=Axis((0, 0, 8), (0, 0, -1)), revolution_arc=125.382690704, mode=Mode.PRIVATE)
    chamfer1_piece_23 = split(chamfer1_piece_23, bisect_by=Plane(origin=(-0.353553391, 0.353553391, 8), z_dir=(-0.7071067811865565, 0.7071067811865386, 0)), keep=Keep.TOP, mode=Mode.PRIVATE)
    chamfer1_piece_23 = split(chamfer1_piece_23, bisect_by=Plane(origin=(0.5, 0, 8), z_dir=(1, 0, 0)), keep=Keep.TOP, mode=Mode.PRIVATE)
    chamfer1_piece_23 = chamfer1_piece_23 - Plane(origin=(0, 0, 8), x_dir=(-0.2040816326530623, 0.9789538738948126, 0), z_dir=(0, 0, -1)) * Cylinder(2.45, 12, mode=Mode.PRIVATE)
    add(chamfer1_piece_23, mode=Mode.SUBTRACT)
    with BuildSketch(Plane(origin=(0, 0, 8), x_dir=(-0.6453423073627307, 0.7638935176631274, 0), z_dir=(-0.7638935176631274, -0.6453423073627307, 0))) as chamfer1_piece_24_section:
        Polygon((2.95, -CHAMFER1_SIZE), (2.95 - CHAMFER1_SIZE, 0), (2.95, 0), align=None)
    chamfer1_piece_24 = revolve(axis=Axis((0, 0, 8), (0, 0, -1)), revolution_arc=125.382690704, mode=Mode.PRIVATE)
    chamfer1_piece_24 = split(chamfer1_piece_24, bisect_by=Plane(origin=(0, 0.5, 8), z_dir=(0, 1, 0)), keep=Keep.TOP, mode=Mode.PRIVATE)
    chamfer1_piece_24 = split(chamfer1_piece_24, bisect_by=Plane(origin=(0.353553391, -0.353553391, 8), z_dir=(0.707106781186556, -0.707106781186539, 0)), keep=Keep.TOP, mode=Mode.PRIVATE)
    chamfer1_piece_24 = chamfer1_piece_24 - Plane(origin=(0, 0, 8), x_dir=(-0.2040816326530623, 0.9789538738948126, 0), z_dir=(0, 0, -1)) * Cylinder(2.45, 12, mode=Mode.PRIVATE)
    add(chamfer1_piece_24, mode=Mode.SUBTRACT)


solid = part.part
